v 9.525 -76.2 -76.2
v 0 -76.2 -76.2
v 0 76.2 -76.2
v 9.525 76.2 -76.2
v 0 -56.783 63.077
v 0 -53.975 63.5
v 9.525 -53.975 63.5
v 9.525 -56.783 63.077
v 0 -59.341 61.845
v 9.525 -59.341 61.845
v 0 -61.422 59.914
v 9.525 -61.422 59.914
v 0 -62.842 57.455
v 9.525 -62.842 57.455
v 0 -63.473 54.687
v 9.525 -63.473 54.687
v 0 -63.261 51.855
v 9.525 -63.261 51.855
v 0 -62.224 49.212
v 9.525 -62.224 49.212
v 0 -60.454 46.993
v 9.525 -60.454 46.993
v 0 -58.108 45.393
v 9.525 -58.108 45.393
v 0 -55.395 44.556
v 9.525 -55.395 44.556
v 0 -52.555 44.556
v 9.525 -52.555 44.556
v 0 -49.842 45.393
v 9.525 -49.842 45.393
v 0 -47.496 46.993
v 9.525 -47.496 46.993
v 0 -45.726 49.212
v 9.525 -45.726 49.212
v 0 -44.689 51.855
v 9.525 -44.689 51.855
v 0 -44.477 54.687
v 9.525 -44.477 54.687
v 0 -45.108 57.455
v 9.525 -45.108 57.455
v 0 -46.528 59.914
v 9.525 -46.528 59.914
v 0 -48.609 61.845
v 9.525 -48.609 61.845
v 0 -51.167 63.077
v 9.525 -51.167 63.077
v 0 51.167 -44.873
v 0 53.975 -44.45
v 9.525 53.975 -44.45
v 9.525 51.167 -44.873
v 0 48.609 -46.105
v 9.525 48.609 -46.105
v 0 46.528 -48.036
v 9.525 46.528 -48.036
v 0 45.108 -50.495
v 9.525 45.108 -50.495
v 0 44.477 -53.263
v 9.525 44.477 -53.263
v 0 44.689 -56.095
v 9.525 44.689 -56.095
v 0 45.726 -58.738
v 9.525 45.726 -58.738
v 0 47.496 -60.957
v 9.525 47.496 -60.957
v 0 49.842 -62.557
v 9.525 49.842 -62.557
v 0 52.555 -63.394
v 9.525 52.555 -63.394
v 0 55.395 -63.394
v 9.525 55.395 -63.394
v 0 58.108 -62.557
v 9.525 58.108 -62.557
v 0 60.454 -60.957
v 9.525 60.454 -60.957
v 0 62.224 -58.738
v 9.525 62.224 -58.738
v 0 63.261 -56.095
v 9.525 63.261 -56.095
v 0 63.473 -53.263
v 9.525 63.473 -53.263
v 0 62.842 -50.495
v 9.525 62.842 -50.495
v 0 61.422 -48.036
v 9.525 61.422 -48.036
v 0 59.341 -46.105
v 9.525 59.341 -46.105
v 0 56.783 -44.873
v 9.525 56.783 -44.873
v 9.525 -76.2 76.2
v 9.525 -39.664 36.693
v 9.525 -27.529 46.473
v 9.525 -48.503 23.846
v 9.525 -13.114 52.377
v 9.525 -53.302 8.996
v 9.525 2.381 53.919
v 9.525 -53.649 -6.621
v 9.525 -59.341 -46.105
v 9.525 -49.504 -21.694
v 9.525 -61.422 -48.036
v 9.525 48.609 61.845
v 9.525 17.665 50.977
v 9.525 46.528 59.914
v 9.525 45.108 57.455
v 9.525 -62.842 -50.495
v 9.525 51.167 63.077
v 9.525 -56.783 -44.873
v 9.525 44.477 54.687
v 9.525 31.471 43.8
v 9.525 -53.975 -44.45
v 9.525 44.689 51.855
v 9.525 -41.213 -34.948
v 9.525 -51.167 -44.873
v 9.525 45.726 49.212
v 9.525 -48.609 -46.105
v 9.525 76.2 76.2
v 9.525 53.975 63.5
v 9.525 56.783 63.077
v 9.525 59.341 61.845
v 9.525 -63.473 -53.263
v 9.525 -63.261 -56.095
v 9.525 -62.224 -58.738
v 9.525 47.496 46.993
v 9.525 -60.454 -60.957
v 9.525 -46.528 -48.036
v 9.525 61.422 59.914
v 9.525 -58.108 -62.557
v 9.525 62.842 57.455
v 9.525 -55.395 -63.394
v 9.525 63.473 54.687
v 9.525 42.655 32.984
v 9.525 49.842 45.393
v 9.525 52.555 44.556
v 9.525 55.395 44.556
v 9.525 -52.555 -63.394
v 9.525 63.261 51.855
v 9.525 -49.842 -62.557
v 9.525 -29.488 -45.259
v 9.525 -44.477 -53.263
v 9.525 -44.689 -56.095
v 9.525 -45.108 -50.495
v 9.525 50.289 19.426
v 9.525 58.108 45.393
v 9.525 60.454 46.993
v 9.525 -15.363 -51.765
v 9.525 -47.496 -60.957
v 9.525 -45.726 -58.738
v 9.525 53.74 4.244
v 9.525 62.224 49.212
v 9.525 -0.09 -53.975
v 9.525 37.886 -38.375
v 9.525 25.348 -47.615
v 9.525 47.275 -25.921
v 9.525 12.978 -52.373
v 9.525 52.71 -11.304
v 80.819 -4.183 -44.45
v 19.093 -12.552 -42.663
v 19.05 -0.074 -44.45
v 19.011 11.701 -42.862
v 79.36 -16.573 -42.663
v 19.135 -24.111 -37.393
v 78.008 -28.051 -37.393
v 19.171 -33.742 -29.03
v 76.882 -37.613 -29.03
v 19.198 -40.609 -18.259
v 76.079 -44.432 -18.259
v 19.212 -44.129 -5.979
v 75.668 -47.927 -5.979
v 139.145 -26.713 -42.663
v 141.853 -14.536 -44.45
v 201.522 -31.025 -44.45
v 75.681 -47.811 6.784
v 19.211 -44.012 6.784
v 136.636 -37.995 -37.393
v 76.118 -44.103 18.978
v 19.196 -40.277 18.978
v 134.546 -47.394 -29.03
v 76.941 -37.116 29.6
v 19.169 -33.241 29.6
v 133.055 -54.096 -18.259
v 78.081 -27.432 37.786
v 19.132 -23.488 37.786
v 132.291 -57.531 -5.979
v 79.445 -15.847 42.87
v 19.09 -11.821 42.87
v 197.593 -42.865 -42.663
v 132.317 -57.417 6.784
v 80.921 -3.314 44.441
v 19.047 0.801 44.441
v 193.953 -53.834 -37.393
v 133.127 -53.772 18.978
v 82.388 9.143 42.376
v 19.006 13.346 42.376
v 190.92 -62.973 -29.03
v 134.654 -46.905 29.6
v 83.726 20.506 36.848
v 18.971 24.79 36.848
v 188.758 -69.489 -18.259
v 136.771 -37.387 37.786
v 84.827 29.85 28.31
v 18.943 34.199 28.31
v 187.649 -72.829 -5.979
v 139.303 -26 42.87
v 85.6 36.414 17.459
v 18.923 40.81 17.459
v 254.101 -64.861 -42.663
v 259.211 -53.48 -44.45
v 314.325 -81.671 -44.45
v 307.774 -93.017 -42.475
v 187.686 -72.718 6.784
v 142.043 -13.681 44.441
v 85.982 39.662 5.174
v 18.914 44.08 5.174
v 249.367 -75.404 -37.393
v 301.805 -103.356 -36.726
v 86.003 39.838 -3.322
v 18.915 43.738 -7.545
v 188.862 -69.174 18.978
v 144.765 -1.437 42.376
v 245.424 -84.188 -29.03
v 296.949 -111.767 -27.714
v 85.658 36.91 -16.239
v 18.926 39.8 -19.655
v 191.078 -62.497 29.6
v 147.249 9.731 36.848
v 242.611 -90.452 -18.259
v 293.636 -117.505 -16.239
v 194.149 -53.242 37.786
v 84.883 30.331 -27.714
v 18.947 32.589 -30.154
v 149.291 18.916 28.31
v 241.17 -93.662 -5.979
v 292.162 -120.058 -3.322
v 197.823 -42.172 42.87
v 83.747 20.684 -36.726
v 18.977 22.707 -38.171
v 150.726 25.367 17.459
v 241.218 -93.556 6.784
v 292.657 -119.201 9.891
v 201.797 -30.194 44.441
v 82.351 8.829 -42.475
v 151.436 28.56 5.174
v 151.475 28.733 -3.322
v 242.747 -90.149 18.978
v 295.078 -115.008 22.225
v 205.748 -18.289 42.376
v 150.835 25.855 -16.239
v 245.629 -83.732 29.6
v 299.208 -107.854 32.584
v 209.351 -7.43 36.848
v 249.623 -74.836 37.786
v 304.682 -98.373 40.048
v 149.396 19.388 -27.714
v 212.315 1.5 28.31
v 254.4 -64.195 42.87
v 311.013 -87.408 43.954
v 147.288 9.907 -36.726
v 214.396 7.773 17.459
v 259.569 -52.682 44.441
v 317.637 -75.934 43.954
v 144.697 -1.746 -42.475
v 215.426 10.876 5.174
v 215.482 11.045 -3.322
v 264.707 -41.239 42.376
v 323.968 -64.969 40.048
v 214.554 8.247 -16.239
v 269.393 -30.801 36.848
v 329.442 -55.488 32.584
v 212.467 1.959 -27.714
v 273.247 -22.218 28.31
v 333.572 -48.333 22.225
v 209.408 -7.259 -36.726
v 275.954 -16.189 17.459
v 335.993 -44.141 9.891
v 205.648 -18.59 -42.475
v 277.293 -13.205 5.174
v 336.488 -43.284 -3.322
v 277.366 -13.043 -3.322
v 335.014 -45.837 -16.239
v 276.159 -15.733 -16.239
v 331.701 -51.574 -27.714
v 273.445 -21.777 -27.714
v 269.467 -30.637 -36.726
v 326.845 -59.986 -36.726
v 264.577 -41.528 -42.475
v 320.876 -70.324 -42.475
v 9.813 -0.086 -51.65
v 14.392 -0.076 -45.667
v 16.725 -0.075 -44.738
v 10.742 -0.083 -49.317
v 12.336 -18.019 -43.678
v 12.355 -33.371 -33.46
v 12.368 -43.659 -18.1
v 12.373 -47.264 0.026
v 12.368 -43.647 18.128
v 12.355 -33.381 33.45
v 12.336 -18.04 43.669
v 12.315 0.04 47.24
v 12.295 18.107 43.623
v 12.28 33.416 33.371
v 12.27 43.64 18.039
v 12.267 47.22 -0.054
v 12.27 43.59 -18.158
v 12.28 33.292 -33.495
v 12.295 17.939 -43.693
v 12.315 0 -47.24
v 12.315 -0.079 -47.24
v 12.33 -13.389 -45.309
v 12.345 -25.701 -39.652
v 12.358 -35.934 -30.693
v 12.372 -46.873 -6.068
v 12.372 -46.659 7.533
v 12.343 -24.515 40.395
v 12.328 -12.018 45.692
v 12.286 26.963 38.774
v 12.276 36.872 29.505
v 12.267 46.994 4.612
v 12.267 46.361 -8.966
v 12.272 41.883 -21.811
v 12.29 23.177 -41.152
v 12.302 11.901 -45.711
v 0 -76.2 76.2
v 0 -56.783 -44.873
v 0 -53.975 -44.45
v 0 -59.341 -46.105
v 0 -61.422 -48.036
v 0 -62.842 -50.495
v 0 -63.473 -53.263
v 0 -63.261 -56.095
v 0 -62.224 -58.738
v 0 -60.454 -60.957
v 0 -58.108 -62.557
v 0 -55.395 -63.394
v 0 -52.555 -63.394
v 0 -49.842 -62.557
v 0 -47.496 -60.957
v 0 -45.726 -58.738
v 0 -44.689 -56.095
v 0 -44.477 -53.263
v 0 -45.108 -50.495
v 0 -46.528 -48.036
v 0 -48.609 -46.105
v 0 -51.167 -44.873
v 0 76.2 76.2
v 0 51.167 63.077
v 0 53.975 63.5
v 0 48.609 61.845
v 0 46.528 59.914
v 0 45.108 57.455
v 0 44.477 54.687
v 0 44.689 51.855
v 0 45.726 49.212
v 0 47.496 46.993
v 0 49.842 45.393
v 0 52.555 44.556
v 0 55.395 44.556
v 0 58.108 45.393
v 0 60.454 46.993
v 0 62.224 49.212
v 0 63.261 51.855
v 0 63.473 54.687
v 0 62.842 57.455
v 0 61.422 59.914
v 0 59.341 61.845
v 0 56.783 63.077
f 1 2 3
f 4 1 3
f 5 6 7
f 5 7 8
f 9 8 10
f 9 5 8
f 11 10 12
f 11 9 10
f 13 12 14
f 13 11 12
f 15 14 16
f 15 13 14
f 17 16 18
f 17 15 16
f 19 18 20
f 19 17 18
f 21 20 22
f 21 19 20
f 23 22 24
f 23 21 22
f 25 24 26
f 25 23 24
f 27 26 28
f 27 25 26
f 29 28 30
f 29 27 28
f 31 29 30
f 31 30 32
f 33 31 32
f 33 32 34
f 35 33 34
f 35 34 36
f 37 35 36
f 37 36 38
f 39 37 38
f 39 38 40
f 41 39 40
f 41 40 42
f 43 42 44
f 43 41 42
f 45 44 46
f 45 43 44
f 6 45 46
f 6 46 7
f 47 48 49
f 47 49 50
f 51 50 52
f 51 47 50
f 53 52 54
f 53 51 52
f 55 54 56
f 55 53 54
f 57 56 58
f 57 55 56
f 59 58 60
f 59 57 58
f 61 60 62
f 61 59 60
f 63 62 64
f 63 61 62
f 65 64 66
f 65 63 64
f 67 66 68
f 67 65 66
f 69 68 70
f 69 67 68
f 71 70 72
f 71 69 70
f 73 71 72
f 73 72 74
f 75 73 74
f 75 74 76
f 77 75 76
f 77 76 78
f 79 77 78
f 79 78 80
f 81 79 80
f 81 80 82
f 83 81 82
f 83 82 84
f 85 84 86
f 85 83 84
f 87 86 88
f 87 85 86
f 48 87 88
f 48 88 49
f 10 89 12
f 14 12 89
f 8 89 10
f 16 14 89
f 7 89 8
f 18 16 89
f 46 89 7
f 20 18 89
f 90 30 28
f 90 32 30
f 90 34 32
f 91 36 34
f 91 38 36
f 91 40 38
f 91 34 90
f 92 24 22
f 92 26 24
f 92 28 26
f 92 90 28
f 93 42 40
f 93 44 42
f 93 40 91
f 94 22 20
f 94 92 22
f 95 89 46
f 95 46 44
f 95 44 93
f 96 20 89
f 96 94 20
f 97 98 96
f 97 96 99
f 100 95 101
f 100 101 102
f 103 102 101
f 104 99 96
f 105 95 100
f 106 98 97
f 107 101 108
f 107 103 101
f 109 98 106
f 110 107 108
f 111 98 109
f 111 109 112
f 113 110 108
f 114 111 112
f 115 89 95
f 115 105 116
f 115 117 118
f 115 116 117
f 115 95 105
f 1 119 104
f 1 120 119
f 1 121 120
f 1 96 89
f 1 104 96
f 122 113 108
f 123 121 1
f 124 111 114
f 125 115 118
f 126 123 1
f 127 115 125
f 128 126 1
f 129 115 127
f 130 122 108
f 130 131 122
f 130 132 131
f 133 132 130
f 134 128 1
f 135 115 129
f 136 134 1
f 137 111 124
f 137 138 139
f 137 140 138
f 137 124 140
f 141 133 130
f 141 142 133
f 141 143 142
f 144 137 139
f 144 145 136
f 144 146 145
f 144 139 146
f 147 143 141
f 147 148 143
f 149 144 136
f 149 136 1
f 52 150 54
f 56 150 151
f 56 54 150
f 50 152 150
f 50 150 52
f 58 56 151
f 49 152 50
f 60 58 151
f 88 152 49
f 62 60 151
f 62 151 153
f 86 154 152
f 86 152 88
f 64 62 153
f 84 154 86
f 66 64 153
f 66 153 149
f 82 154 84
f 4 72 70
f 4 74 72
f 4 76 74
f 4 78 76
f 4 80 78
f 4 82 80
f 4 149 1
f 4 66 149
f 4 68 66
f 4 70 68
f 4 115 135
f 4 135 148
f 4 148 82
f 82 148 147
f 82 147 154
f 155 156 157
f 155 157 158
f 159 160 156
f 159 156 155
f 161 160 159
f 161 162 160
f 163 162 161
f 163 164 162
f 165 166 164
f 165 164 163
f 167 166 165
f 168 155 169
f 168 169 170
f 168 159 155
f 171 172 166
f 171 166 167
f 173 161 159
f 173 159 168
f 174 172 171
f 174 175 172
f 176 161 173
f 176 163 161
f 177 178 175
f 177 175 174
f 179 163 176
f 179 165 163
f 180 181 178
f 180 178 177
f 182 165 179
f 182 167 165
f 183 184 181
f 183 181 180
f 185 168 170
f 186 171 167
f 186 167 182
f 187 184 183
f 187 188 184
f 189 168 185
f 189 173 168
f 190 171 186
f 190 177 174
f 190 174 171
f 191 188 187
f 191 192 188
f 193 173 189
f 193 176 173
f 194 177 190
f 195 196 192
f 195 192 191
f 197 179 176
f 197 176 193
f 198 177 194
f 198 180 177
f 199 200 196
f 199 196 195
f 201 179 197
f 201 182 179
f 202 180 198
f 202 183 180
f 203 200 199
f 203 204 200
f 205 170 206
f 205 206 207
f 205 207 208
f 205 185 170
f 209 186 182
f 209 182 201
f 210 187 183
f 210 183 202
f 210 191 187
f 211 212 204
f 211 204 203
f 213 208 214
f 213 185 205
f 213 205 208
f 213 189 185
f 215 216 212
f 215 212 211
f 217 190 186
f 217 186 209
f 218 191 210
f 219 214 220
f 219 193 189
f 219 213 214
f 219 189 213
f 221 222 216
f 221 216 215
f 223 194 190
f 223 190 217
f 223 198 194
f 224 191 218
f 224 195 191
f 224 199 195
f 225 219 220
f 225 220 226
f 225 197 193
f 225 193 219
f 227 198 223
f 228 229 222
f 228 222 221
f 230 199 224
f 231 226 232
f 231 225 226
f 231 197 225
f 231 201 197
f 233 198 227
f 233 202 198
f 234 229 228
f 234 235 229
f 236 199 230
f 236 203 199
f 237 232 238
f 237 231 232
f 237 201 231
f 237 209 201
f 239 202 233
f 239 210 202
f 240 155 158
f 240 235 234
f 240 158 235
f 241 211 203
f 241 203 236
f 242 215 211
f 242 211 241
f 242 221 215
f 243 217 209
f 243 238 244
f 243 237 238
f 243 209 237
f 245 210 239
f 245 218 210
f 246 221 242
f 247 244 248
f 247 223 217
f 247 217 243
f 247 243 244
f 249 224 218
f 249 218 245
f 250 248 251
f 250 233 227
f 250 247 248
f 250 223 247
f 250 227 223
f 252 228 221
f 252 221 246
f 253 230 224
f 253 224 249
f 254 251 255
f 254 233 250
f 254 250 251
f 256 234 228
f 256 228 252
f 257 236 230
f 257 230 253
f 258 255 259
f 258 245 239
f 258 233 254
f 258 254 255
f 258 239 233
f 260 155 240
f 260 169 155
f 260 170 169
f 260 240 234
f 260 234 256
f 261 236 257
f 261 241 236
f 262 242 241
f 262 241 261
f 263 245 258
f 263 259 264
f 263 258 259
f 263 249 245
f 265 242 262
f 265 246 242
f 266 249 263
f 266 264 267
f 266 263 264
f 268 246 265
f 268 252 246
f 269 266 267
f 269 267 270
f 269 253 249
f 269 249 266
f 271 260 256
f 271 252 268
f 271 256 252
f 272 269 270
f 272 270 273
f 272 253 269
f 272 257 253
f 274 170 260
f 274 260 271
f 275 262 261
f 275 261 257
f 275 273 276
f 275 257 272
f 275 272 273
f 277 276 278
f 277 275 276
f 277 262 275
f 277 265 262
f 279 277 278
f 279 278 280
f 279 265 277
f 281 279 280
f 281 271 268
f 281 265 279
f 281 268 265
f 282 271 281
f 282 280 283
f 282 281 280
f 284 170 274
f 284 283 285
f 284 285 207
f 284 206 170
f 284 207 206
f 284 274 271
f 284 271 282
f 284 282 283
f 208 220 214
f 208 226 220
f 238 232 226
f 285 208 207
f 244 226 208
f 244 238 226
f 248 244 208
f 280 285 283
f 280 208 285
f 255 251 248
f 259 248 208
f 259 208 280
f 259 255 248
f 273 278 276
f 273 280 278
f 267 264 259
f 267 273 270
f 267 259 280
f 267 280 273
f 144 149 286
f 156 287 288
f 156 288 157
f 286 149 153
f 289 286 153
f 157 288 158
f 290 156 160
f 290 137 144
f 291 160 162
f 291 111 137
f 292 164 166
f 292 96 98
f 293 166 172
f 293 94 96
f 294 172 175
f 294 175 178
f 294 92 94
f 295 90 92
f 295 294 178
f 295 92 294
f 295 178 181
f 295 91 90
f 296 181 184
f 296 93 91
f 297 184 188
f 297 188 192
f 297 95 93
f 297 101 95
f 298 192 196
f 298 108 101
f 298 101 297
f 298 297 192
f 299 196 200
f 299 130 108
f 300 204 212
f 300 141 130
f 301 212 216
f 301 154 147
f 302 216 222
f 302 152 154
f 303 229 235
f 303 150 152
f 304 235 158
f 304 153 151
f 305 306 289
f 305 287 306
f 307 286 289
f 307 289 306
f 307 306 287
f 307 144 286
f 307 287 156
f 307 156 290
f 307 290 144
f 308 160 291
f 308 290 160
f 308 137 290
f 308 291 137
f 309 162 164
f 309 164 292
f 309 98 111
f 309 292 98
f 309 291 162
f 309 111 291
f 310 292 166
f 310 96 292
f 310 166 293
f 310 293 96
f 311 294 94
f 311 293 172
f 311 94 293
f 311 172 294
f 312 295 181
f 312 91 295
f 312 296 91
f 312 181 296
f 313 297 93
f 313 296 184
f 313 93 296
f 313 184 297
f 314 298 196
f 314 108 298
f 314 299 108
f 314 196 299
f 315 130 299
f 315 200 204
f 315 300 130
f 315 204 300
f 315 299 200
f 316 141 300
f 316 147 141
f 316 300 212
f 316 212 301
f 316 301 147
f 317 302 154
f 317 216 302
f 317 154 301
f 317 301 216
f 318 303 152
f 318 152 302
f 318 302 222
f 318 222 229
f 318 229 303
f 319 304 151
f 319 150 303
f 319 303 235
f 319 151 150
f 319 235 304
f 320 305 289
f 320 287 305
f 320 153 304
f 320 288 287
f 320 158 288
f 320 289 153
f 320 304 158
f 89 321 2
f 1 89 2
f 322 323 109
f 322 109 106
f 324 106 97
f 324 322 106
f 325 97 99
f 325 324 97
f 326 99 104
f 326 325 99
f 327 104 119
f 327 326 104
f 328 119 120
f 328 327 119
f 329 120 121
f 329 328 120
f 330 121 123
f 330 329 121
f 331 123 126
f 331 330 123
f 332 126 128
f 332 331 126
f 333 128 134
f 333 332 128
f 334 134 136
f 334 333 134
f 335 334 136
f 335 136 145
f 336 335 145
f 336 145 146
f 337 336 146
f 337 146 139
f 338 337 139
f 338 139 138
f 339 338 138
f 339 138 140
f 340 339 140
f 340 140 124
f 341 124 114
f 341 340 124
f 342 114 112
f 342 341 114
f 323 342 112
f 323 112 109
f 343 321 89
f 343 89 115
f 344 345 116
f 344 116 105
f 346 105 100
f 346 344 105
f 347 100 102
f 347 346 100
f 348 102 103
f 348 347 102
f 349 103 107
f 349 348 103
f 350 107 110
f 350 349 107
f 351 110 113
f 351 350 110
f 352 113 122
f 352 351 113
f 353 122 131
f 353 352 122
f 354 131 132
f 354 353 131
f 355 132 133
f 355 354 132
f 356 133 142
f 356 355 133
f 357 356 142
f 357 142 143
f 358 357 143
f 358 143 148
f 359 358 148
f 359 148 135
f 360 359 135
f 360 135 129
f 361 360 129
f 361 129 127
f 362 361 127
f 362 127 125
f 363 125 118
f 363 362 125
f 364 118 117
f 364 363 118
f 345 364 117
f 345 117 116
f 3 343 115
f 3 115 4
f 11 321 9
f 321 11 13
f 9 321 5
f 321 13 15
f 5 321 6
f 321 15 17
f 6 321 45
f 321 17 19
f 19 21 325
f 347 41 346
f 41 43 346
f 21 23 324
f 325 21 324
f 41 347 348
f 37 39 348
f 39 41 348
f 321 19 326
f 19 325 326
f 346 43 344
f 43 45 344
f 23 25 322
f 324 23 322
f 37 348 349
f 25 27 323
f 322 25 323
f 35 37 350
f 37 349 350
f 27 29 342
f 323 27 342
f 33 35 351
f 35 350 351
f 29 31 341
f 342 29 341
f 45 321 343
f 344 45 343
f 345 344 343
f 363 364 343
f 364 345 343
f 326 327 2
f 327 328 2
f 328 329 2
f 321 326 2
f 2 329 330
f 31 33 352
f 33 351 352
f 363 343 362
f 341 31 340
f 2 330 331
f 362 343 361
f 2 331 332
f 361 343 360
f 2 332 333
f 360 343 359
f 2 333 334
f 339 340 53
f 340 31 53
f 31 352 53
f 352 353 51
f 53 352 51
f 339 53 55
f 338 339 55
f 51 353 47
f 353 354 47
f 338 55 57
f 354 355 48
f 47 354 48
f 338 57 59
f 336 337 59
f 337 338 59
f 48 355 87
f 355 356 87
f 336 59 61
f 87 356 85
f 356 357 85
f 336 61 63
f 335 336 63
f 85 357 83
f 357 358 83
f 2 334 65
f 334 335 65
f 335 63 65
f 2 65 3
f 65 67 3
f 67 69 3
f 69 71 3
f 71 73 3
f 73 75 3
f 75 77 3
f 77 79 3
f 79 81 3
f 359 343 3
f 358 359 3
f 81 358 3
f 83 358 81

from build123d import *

# Parameters (mm, degrees)
SKETCH1_W      = 152.4
SKETCH1_H      = 152.4
SKETCH1_R      = 9.525
EXTRUDE1_DEPTH = 9.525
SKETCH3_R      = 44.45
FILLET1_R      = 9.525


with BuildPart() as part:
    # Sketch1 → Extrude1 (new body)
    with BuildSketch(Plane(origin=(0, 0, 0), x_dir=(0, 0, -1), z_dir=(1, 0, 0))):
        Rectangle(SKETCH1_W, SKETCH1_H)
        with Locations(Location((-53.975, 53.975, 0), (0, 0, 180))):
            Circle(SKETCH1_R, mode=Mode.SUBTRACT)
        with Locations(Location((-53.975, -53.975, 0), (0, 0, 180))):
            Circle(SKETCH1_R, mode=Mode.SUBTRACT)
        with Locations(Location((53.975, -53.975, 0), (0, 0, 180))):
            Circle(SKETCH1_R, mode=Mode.SUBTRACT)
        with Locations(Location((53.975, 53.975, 0), (0, 0, 180))):
            Circle(SKETCH1_R, mode=Mode.SUBTRACT)
    extrude(amount=EXTRUDE1_DEPTH)

    # Sweep1: sweep along a path in Sketch2
    with BuildLine(Plane.XY) as sweep1_path:
        ThreePointArc((9.525, 0), (167.301089894, -20.771616294), (314.325, -81.670913853))
    # Sketch3 → Sweep1 (sweep)
    with BuildSketch(Plane(origin=(9.525, 0, 0), x_dir=(0, 0, -1), z_dir=(1, 0, 0))):
        Circle(SKETCH3_R)
    sweep(path=sweep1_path.line)

    # Fillet1
    fillet1_edges = [part.edges().sort_by_distance(p)[0] for p in [
        (9.525, 0, 44.45),
    ]]
    fillet(fillet1_edges, radius=FILLET1_R)


solid = part.part
